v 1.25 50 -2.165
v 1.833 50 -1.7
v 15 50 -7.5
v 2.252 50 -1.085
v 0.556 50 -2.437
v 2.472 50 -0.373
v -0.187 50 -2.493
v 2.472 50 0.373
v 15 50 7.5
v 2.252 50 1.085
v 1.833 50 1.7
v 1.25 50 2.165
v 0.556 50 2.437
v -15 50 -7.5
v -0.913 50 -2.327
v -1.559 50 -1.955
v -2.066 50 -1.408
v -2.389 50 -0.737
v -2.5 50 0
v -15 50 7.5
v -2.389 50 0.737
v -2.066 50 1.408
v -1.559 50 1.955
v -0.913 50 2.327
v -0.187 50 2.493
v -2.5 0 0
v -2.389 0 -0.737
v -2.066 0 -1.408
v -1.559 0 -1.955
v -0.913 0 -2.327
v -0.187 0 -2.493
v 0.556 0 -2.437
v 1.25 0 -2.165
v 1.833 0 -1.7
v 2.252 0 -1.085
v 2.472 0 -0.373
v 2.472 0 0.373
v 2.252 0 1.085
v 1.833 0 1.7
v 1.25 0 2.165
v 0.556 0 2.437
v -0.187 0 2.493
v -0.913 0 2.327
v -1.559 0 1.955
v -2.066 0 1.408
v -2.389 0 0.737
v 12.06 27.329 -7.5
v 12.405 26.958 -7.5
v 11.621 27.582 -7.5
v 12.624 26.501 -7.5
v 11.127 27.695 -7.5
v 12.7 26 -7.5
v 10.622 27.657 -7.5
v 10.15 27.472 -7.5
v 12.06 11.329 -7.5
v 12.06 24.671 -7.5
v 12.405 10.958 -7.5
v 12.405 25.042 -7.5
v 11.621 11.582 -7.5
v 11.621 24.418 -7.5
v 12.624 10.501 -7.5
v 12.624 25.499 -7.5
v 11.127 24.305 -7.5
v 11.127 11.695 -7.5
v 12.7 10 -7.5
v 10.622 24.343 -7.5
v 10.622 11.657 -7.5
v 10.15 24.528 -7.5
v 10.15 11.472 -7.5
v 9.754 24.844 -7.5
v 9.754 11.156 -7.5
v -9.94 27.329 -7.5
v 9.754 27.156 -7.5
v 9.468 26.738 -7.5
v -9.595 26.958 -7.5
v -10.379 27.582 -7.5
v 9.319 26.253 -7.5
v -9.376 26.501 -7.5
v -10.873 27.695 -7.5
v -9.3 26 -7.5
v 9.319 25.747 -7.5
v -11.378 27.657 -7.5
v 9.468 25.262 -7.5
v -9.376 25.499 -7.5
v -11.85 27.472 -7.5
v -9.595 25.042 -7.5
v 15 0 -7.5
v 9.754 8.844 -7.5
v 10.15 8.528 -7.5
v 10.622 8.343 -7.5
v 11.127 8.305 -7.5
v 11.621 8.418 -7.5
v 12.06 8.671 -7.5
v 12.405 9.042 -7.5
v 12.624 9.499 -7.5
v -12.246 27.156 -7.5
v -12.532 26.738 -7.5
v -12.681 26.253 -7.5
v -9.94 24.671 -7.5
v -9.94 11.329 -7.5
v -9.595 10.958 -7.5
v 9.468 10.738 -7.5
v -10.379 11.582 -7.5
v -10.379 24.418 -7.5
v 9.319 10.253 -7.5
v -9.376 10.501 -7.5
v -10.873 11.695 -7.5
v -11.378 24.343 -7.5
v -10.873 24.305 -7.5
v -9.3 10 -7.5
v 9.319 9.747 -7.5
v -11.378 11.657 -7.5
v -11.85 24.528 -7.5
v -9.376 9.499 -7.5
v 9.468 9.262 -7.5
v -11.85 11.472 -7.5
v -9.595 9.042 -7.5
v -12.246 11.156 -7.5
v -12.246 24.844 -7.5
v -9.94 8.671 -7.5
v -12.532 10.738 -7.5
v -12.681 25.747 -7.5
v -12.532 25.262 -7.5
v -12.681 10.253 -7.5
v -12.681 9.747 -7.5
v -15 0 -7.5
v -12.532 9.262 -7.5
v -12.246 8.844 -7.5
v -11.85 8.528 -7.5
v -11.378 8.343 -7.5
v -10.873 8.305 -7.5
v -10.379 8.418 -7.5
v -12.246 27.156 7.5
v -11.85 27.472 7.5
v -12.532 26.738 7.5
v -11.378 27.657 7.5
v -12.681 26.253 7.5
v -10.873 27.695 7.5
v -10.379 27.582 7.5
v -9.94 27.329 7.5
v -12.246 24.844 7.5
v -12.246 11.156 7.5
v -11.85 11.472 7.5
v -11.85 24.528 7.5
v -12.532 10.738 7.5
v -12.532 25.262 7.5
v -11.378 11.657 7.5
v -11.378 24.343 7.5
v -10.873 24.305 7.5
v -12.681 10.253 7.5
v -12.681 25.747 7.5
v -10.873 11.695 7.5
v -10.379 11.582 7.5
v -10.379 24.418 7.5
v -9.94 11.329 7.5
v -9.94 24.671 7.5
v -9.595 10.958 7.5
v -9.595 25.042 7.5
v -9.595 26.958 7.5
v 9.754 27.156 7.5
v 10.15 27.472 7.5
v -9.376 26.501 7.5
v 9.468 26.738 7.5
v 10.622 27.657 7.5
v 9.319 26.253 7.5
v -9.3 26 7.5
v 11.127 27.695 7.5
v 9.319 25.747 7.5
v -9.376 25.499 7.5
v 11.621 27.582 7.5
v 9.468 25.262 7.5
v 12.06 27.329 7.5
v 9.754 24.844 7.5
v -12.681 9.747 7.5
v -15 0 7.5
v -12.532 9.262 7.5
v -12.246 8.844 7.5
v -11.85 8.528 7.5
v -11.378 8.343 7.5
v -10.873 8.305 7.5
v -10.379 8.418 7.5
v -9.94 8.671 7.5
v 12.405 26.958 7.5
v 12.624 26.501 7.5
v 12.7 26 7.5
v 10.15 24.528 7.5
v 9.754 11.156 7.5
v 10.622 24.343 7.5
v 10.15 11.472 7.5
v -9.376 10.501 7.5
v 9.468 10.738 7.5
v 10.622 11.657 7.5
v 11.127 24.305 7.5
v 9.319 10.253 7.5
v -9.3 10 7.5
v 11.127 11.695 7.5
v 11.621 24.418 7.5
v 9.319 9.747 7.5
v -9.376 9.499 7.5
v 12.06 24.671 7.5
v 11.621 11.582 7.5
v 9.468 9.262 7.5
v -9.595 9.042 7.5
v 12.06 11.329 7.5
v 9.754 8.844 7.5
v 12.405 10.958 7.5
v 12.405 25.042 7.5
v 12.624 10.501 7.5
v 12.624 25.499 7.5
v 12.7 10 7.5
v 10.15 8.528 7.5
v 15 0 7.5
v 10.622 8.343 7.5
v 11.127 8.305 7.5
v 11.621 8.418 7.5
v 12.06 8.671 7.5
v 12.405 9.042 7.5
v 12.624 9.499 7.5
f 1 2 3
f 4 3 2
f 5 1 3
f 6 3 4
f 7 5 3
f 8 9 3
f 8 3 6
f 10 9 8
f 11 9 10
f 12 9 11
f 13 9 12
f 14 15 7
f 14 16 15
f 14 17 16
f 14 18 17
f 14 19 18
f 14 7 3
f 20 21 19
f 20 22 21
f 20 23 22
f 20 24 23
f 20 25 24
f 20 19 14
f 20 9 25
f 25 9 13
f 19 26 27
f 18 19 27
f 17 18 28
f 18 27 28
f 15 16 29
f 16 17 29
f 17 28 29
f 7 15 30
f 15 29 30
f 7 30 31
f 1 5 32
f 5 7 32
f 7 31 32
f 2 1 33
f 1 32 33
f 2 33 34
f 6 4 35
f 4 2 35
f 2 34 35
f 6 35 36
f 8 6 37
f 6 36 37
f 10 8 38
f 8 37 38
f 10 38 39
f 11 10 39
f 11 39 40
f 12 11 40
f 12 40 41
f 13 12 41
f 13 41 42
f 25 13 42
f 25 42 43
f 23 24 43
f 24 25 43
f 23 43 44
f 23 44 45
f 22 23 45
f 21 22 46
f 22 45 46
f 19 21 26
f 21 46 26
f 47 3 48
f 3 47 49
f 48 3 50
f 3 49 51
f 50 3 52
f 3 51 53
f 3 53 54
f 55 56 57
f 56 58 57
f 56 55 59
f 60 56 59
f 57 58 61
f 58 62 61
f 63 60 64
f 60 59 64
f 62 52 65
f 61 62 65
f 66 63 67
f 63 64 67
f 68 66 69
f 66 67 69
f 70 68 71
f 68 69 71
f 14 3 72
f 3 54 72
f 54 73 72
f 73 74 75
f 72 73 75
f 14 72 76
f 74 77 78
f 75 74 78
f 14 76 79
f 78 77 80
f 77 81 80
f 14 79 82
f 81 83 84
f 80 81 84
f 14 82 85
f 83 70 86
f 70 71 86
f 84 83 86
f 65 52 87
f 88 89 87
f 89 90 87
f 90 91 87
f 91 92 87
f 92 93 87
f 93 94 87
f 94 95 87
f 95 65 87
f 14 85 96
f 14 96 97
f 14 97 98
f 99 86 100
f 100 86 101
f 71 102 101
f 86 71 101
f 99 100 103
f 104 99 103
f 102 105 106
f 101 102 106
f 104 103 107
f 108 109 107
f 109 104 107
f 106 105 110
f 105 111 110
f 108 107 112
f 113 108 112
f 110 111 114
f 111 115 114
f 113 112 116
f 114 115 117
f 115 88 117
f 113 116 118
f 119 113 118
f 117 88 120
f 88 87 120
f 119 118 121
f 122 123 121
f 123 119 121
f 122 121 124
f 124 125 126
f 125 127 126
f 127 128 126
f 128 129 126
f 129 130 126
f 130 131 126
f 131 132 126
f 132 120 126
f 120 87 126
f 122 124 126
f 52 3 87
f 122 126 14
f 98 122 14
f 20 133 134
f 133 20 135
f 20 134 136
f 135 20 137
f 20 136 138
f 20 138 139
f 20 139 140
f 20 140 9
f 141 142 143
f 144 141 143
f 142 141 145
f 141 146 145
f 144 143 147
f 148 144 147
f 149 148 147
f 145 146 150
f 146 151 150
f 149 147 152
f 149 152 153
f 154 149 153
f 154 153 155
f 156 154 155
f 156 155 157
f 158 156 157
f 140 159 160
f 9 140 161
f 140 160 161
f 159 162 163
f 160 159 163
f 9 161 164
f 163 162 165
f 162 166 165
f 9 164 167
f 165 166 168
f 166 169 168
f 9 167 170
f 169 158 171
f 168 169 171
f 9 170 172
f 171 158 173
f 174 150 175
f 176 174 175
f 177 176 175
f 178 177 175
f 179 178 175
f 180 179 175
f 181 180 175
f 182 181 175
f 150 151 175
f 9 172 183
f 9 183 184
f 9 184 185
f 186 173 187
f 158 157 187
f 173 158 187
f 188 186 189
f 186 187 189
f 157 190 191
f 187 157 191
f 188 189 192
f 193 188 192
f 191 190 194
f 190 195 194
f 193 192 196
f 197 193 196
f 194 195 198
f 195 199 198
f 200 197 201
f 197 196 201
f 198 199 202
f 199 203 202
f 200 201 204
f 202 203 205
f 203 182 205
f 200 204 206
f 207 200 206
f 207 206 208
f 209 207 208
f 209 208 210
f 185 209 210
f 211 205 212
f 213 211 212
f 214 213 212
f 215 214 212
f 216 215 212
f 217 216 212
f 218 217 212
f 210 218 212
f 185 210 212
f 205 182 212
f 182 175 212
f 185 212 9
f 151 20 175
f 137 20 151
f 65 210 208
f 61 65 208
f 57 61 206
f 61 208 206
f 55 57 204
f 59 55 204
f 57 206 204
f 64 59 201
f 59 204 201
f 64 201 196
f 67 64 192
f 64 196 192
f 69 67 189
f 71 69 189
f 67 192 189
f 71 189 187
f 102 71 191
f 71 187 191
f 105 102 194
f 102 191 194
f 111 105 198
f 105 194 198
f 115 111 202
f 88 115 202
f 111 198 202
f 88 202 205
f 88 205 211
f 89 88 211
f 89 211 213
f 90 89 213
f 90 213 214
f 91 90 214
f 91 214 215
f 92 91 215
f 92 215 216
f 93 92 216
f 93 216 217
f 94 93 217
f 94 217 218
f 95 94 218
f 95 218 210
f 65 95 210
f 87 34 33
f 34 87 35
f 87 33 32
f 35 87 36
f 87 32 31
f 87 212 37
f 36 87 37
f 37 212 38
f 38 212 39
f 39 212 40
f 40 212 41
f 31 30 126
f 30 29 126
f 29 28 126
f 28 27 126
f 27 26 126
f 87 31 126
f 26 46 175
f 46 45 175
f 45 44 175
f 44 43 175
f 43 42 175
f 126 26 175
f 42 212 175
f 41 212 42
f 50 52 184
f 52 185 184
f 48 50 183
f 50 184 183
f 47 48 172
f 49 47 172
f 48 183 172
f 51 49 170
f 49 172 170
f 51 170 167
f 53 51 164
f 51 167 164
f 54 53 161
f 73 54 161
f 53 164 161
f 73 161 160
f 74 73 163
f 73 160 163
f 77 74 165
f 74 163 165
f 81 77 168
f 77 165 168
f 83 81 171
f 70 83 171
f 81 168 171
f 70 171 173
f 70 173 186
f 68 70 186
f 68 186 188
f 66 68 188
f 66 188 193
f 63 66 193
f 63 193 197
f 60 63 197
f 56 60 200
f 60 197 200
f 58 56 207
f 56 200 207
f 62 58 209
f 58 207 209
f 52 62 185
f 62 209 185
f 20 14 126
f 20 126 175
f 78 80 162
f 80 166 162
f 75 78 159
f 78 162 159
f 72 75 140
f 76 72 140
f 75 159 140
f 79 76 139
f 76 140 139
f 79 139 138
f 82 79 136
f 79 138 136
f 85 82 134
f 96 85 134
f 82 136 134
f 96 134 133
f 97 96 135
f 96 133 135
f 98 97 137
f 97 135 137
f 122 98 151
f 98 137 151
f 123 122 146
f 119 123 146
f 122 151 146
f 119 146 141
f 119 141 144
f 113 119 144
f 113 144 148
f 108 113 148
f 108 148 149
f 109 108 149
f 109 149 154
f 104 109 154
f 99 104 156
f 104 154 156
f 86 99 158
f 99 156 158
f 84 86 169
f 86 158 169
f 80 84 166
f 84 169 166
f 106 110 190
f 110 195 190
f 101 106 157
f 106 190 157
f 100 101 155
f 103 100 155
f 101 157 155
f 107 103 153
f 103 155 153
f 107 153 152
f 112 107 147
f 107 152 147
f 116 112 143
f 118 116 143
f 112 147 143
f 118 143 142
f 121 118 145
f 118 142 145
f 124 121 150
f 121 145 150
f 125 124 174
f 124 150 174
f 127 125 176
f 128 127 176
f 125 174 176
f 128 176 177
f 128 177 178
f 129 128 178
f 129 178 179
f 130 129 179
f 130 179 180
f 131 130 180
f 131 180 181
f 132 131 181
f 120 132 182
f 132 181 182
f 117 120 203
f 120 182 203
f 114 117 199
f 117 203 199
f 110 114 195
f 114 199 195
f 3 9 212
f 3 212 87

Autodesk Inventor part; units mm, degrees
ref_plane "YZ Plane" through (0, 0, 0) normal (1, 0, 0) x (0, 1, 0)
ref_plane "XZ Plane" through (0, 0, 0) normal (0, 1, 0) x (-1, 0, 0)
ref_plane "XY Plane" through (0, 0, 0) normal (0, 0, 1) x (1, 0, 0)
sketch "Skizze1" plane through (0, 0, 0) normal (0, 1, 0) x (-1, 0, 0)
  point P0 (0, 0)
sketch "Skizze2" plane through (0, 0, 0) normal (0, 1, 0) x (-1, 0, 0)
  line L0 (15, 7.5) -> (-15, 7.5)
  line L1 (-15, 7.5) -> (-15, -7.5)
  line L2 (-15, -7.5) -> (15, -7.5)
  line L3 (15, -7.5) -> (15, 7.5)
  circle A0 centre (0, 0) radius 2.5
  dimension "d4" = 15
  dimension "d5" = 30
  dimension "d6" = 15
  dimension "d7" = 7.5
  dimension "d8" = 5
extrude "Extrusion1" add sketch "Skizze2" along normal blind 50
sketch "Skizze3" plane through (-15, 0, 7.5) normal (0, 0, 1) x (1, 0, 0)
  circle A0 centre (4, 10) radius 1.7
  circle A1 centre (4, 26) radius 1.7
  circle A2 centre (26, 10) radius 1.7
  circle A3 centre (26, 26) radius 1.7
  line L0 (30, 0) -> (30, 50) projected
  line L1 (0, 0) -> (0, 50) projected
  line L2 (0, 0) -> (30, 0) projected
  point P0 (15, 0)
  dimension "d11" = 22
  dimension "d12" = 3.4
  dimension "d13" = 3.4
  dimension "d14" = 3.4
  dimension "d15" = 3.4
  dimension "d16" = 4
  dimension "d17" = 16
  dimension "d18" = 4
  dimension "d19" = 16
  dimension "d20" = 4
  dimension "d21" = 22
  dimension "d22" = 10
extrude "Extrusion2" cut sketch "Skizze3" against normal blind 15
properties part number "Gegenstück Rotorachse"
